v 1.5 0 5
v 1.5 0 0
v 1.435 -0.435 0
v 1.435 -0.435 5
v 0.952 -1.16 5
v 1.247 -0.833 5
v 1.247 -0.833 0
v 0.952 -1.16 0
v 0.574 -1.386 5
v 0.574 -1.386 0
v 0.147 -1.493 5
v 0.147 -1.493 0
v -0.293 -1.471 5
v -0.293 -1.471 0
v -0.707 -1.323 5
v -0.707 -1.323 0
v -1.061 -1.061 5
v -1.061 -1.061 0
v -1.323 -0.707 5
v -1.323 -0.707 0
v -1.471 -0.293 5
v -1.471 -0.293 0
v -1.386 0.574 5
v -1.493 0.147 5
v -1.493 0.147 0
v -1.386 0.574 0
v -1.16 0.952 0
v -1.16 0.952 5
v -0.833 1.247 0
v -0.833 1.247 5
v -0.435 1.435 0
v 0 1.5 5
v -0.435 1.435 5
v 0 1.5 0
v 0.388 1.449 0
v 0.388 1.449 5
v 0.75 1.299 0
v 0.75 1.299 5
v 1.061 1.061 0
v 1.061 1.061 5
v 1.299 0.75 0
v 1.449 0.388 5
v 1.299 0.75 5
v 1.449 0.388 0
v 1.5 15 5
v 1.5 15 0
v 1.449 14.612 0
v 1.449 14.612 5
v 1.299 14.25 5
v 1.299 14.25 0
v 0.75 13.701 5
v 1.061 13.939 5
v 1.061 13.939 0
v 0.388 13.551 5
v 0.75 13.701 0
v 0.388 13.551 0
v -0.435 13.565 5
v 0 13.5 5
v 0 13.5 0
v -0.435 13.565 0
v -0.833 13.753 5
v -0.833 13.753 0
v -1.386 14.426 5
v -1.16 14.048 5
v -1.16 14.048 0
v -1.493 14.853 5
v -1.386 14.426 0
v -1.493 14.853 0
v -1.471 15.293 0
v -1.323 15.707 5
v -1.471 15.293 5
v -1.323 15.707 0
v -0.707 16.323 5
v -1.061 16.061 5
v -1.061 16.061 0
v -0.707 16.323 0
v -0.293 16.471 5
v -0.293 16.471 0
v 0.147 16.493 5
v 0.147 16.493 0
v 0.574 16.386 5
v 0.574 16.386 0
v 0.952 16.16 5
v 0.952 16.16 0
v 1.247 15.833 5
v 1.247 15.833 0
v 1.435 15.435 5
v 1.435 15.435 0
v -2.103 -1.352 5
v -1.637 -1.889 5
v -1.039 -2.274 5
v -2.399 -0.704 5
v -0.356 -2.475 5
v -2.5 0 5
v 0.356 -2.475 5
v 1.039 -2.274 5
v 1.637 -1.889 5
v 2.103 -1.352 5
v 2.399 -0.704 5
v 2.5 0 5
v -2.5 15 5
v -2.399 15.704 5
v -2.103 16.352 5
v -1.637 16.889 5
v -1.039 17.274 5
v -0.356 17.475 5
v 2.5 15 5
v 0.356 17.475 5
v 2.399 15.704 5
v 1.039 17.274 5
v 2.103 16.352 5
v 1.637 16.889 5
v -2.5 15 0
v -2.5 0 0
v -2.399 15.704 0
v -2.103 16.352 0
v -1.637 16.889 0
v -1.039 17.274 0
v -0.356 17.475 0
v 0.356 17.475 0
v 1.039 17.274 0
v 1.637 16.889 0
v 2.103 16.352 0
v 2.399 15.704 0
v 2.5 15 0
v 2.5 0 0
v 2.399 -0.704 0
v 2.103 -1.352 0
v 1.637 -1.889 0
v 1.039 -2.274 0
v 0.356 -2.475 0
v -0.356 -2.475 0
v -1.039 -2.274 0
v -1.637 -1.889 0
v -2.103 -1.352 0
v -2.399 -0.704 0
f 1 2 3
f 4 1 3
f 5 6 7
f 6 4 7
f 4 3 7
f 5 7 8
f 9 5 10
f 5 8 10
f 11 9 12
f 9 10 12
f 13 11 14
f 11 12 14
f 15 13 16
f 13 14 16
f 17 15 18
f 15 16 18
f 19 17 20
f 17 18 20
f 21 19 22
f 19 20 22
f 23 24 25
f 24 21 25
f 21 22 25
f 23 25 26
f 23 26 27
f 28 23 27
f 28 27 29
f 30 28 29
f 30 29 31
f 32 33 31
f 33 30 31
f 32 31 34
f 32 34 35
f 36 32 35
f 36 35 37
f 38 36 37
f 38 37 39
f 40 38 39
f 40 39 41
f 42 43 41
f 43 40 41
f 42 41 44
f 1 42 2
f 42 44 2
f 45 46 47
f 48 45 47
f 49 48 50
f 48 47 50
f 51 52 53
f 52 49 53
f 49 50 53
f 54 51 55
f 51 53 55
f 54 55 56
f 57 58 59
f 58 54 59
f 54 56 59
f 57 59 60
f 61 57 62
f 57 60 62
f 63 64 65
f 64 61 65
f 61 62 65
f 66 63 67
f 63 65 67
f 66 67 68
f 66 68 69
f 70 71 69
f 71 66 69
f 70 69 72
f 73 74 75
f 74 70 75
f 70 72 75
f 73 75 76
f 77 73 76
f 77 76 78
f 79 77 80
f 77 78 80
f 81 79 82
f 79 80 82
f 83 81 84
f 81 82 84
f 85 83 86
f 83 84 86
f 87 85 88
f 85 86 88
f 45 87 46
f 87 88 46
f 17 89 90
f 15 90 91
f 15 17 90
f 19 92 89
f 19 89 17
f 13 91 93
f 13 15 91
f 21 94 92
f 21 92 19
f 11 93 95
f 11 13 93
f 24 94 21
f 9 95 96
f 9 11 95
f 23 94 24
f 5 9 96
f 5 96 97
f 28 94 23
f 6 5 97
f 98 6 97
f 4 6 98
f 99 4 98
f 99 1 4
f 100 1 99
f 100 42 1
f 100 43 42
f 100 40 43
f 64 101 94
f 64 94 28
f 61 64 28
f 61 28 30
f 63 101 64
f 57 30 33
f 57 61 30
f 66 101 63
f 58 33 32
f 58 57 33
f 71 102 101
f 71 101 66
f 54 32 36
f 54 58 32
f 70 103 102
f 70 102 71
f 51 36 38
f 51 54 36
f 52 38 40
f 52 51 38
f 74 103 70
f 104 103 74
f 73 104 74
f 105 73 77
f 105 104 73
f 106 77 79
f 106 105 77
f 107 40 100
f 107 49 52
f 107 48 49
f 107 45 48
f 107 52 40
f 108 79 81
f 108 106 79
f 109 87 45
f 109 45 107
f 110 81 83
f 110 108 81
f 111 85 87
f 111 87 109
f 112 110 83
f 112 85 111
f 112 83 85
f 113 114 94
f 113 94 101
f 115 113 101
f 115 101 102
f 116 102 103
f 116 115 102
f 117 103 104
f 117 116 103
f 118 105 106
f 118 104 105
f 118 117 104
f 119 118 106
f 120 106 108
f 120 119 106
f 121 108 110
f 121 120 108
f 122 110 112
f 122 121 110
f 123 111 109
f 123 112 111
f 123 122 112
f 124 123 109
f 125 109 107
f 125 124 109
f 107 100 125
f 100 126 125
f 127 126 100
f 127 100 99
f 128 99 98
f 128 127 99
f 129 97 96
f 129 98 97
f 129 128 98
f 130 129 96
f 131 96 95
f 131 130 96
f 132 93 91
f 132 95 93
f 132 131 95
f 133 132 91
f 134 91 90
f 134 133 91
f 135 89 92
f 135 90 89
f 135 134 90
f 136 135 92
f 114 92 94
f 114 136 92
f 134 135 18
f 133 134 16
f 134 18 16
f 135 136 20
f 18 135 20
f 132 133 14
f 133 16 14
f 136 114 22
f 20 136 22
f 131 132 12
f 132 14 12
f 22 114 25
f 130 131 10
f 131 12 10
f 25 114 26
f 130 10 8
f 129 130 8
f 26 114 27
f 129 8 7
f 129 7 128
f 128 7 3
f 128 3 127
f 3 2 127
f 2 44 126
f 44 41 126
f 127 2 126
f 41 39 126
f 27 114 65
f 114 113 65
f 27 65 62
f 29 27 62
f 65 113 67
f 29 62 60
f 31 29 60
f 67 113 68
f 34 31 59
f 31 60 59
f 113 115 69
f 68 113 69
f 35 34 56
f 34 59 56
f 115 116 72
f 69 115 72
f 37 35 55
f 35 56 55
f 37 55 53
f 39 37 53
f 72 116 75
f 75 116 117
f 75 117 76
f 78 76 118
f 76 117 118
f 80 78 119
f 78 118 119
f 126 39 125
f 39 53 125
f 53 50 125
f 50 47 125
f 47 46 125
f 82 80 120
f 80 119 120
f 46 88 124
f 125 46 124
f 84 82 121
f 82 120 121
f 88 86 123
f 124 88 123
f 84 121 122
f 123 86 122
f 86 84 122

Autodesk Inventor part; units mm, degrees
ref_plane "YZ Plane" through (0, 0, 0) normal (1, 0, 0) x (0, 1, 0)
ref_plane "XZ Plane" through (0, 0, 0) normal (0, 1, 0) x (-1, 0, 0)
ref_plane "XY Plane" through (0, 0, 0) normal (0, 0, 1) x (1, 0, 0)
sketch "Sketch1" plane through (0, 0, 0) normal (0, 0, 1) x (1, 0, 0)
  circle A0 centre (0, 0) radius 1.5
  circle A1 centre (0, 0) radius 2.5
  line L0 (0, 0) -> (0, 15)
  circle A2 centre (0, 15) radius 1.5
  circle A3 centre (0, 15) radius 2.5
  line L1 (-2.5, 0) -> (-2.5, 15)
  line L2 (2.5, 0) -> (2.5, 15)
  dimension "d0" = 3
  dimension "d1" = 5
  dimension "d2" = 15
  dimension "d3" = 3
  dimension "d4" = 5
extrude "Extrusion1" add sketch "Sketch1" along normal blind 5
properties part number "bar_mid_2"
